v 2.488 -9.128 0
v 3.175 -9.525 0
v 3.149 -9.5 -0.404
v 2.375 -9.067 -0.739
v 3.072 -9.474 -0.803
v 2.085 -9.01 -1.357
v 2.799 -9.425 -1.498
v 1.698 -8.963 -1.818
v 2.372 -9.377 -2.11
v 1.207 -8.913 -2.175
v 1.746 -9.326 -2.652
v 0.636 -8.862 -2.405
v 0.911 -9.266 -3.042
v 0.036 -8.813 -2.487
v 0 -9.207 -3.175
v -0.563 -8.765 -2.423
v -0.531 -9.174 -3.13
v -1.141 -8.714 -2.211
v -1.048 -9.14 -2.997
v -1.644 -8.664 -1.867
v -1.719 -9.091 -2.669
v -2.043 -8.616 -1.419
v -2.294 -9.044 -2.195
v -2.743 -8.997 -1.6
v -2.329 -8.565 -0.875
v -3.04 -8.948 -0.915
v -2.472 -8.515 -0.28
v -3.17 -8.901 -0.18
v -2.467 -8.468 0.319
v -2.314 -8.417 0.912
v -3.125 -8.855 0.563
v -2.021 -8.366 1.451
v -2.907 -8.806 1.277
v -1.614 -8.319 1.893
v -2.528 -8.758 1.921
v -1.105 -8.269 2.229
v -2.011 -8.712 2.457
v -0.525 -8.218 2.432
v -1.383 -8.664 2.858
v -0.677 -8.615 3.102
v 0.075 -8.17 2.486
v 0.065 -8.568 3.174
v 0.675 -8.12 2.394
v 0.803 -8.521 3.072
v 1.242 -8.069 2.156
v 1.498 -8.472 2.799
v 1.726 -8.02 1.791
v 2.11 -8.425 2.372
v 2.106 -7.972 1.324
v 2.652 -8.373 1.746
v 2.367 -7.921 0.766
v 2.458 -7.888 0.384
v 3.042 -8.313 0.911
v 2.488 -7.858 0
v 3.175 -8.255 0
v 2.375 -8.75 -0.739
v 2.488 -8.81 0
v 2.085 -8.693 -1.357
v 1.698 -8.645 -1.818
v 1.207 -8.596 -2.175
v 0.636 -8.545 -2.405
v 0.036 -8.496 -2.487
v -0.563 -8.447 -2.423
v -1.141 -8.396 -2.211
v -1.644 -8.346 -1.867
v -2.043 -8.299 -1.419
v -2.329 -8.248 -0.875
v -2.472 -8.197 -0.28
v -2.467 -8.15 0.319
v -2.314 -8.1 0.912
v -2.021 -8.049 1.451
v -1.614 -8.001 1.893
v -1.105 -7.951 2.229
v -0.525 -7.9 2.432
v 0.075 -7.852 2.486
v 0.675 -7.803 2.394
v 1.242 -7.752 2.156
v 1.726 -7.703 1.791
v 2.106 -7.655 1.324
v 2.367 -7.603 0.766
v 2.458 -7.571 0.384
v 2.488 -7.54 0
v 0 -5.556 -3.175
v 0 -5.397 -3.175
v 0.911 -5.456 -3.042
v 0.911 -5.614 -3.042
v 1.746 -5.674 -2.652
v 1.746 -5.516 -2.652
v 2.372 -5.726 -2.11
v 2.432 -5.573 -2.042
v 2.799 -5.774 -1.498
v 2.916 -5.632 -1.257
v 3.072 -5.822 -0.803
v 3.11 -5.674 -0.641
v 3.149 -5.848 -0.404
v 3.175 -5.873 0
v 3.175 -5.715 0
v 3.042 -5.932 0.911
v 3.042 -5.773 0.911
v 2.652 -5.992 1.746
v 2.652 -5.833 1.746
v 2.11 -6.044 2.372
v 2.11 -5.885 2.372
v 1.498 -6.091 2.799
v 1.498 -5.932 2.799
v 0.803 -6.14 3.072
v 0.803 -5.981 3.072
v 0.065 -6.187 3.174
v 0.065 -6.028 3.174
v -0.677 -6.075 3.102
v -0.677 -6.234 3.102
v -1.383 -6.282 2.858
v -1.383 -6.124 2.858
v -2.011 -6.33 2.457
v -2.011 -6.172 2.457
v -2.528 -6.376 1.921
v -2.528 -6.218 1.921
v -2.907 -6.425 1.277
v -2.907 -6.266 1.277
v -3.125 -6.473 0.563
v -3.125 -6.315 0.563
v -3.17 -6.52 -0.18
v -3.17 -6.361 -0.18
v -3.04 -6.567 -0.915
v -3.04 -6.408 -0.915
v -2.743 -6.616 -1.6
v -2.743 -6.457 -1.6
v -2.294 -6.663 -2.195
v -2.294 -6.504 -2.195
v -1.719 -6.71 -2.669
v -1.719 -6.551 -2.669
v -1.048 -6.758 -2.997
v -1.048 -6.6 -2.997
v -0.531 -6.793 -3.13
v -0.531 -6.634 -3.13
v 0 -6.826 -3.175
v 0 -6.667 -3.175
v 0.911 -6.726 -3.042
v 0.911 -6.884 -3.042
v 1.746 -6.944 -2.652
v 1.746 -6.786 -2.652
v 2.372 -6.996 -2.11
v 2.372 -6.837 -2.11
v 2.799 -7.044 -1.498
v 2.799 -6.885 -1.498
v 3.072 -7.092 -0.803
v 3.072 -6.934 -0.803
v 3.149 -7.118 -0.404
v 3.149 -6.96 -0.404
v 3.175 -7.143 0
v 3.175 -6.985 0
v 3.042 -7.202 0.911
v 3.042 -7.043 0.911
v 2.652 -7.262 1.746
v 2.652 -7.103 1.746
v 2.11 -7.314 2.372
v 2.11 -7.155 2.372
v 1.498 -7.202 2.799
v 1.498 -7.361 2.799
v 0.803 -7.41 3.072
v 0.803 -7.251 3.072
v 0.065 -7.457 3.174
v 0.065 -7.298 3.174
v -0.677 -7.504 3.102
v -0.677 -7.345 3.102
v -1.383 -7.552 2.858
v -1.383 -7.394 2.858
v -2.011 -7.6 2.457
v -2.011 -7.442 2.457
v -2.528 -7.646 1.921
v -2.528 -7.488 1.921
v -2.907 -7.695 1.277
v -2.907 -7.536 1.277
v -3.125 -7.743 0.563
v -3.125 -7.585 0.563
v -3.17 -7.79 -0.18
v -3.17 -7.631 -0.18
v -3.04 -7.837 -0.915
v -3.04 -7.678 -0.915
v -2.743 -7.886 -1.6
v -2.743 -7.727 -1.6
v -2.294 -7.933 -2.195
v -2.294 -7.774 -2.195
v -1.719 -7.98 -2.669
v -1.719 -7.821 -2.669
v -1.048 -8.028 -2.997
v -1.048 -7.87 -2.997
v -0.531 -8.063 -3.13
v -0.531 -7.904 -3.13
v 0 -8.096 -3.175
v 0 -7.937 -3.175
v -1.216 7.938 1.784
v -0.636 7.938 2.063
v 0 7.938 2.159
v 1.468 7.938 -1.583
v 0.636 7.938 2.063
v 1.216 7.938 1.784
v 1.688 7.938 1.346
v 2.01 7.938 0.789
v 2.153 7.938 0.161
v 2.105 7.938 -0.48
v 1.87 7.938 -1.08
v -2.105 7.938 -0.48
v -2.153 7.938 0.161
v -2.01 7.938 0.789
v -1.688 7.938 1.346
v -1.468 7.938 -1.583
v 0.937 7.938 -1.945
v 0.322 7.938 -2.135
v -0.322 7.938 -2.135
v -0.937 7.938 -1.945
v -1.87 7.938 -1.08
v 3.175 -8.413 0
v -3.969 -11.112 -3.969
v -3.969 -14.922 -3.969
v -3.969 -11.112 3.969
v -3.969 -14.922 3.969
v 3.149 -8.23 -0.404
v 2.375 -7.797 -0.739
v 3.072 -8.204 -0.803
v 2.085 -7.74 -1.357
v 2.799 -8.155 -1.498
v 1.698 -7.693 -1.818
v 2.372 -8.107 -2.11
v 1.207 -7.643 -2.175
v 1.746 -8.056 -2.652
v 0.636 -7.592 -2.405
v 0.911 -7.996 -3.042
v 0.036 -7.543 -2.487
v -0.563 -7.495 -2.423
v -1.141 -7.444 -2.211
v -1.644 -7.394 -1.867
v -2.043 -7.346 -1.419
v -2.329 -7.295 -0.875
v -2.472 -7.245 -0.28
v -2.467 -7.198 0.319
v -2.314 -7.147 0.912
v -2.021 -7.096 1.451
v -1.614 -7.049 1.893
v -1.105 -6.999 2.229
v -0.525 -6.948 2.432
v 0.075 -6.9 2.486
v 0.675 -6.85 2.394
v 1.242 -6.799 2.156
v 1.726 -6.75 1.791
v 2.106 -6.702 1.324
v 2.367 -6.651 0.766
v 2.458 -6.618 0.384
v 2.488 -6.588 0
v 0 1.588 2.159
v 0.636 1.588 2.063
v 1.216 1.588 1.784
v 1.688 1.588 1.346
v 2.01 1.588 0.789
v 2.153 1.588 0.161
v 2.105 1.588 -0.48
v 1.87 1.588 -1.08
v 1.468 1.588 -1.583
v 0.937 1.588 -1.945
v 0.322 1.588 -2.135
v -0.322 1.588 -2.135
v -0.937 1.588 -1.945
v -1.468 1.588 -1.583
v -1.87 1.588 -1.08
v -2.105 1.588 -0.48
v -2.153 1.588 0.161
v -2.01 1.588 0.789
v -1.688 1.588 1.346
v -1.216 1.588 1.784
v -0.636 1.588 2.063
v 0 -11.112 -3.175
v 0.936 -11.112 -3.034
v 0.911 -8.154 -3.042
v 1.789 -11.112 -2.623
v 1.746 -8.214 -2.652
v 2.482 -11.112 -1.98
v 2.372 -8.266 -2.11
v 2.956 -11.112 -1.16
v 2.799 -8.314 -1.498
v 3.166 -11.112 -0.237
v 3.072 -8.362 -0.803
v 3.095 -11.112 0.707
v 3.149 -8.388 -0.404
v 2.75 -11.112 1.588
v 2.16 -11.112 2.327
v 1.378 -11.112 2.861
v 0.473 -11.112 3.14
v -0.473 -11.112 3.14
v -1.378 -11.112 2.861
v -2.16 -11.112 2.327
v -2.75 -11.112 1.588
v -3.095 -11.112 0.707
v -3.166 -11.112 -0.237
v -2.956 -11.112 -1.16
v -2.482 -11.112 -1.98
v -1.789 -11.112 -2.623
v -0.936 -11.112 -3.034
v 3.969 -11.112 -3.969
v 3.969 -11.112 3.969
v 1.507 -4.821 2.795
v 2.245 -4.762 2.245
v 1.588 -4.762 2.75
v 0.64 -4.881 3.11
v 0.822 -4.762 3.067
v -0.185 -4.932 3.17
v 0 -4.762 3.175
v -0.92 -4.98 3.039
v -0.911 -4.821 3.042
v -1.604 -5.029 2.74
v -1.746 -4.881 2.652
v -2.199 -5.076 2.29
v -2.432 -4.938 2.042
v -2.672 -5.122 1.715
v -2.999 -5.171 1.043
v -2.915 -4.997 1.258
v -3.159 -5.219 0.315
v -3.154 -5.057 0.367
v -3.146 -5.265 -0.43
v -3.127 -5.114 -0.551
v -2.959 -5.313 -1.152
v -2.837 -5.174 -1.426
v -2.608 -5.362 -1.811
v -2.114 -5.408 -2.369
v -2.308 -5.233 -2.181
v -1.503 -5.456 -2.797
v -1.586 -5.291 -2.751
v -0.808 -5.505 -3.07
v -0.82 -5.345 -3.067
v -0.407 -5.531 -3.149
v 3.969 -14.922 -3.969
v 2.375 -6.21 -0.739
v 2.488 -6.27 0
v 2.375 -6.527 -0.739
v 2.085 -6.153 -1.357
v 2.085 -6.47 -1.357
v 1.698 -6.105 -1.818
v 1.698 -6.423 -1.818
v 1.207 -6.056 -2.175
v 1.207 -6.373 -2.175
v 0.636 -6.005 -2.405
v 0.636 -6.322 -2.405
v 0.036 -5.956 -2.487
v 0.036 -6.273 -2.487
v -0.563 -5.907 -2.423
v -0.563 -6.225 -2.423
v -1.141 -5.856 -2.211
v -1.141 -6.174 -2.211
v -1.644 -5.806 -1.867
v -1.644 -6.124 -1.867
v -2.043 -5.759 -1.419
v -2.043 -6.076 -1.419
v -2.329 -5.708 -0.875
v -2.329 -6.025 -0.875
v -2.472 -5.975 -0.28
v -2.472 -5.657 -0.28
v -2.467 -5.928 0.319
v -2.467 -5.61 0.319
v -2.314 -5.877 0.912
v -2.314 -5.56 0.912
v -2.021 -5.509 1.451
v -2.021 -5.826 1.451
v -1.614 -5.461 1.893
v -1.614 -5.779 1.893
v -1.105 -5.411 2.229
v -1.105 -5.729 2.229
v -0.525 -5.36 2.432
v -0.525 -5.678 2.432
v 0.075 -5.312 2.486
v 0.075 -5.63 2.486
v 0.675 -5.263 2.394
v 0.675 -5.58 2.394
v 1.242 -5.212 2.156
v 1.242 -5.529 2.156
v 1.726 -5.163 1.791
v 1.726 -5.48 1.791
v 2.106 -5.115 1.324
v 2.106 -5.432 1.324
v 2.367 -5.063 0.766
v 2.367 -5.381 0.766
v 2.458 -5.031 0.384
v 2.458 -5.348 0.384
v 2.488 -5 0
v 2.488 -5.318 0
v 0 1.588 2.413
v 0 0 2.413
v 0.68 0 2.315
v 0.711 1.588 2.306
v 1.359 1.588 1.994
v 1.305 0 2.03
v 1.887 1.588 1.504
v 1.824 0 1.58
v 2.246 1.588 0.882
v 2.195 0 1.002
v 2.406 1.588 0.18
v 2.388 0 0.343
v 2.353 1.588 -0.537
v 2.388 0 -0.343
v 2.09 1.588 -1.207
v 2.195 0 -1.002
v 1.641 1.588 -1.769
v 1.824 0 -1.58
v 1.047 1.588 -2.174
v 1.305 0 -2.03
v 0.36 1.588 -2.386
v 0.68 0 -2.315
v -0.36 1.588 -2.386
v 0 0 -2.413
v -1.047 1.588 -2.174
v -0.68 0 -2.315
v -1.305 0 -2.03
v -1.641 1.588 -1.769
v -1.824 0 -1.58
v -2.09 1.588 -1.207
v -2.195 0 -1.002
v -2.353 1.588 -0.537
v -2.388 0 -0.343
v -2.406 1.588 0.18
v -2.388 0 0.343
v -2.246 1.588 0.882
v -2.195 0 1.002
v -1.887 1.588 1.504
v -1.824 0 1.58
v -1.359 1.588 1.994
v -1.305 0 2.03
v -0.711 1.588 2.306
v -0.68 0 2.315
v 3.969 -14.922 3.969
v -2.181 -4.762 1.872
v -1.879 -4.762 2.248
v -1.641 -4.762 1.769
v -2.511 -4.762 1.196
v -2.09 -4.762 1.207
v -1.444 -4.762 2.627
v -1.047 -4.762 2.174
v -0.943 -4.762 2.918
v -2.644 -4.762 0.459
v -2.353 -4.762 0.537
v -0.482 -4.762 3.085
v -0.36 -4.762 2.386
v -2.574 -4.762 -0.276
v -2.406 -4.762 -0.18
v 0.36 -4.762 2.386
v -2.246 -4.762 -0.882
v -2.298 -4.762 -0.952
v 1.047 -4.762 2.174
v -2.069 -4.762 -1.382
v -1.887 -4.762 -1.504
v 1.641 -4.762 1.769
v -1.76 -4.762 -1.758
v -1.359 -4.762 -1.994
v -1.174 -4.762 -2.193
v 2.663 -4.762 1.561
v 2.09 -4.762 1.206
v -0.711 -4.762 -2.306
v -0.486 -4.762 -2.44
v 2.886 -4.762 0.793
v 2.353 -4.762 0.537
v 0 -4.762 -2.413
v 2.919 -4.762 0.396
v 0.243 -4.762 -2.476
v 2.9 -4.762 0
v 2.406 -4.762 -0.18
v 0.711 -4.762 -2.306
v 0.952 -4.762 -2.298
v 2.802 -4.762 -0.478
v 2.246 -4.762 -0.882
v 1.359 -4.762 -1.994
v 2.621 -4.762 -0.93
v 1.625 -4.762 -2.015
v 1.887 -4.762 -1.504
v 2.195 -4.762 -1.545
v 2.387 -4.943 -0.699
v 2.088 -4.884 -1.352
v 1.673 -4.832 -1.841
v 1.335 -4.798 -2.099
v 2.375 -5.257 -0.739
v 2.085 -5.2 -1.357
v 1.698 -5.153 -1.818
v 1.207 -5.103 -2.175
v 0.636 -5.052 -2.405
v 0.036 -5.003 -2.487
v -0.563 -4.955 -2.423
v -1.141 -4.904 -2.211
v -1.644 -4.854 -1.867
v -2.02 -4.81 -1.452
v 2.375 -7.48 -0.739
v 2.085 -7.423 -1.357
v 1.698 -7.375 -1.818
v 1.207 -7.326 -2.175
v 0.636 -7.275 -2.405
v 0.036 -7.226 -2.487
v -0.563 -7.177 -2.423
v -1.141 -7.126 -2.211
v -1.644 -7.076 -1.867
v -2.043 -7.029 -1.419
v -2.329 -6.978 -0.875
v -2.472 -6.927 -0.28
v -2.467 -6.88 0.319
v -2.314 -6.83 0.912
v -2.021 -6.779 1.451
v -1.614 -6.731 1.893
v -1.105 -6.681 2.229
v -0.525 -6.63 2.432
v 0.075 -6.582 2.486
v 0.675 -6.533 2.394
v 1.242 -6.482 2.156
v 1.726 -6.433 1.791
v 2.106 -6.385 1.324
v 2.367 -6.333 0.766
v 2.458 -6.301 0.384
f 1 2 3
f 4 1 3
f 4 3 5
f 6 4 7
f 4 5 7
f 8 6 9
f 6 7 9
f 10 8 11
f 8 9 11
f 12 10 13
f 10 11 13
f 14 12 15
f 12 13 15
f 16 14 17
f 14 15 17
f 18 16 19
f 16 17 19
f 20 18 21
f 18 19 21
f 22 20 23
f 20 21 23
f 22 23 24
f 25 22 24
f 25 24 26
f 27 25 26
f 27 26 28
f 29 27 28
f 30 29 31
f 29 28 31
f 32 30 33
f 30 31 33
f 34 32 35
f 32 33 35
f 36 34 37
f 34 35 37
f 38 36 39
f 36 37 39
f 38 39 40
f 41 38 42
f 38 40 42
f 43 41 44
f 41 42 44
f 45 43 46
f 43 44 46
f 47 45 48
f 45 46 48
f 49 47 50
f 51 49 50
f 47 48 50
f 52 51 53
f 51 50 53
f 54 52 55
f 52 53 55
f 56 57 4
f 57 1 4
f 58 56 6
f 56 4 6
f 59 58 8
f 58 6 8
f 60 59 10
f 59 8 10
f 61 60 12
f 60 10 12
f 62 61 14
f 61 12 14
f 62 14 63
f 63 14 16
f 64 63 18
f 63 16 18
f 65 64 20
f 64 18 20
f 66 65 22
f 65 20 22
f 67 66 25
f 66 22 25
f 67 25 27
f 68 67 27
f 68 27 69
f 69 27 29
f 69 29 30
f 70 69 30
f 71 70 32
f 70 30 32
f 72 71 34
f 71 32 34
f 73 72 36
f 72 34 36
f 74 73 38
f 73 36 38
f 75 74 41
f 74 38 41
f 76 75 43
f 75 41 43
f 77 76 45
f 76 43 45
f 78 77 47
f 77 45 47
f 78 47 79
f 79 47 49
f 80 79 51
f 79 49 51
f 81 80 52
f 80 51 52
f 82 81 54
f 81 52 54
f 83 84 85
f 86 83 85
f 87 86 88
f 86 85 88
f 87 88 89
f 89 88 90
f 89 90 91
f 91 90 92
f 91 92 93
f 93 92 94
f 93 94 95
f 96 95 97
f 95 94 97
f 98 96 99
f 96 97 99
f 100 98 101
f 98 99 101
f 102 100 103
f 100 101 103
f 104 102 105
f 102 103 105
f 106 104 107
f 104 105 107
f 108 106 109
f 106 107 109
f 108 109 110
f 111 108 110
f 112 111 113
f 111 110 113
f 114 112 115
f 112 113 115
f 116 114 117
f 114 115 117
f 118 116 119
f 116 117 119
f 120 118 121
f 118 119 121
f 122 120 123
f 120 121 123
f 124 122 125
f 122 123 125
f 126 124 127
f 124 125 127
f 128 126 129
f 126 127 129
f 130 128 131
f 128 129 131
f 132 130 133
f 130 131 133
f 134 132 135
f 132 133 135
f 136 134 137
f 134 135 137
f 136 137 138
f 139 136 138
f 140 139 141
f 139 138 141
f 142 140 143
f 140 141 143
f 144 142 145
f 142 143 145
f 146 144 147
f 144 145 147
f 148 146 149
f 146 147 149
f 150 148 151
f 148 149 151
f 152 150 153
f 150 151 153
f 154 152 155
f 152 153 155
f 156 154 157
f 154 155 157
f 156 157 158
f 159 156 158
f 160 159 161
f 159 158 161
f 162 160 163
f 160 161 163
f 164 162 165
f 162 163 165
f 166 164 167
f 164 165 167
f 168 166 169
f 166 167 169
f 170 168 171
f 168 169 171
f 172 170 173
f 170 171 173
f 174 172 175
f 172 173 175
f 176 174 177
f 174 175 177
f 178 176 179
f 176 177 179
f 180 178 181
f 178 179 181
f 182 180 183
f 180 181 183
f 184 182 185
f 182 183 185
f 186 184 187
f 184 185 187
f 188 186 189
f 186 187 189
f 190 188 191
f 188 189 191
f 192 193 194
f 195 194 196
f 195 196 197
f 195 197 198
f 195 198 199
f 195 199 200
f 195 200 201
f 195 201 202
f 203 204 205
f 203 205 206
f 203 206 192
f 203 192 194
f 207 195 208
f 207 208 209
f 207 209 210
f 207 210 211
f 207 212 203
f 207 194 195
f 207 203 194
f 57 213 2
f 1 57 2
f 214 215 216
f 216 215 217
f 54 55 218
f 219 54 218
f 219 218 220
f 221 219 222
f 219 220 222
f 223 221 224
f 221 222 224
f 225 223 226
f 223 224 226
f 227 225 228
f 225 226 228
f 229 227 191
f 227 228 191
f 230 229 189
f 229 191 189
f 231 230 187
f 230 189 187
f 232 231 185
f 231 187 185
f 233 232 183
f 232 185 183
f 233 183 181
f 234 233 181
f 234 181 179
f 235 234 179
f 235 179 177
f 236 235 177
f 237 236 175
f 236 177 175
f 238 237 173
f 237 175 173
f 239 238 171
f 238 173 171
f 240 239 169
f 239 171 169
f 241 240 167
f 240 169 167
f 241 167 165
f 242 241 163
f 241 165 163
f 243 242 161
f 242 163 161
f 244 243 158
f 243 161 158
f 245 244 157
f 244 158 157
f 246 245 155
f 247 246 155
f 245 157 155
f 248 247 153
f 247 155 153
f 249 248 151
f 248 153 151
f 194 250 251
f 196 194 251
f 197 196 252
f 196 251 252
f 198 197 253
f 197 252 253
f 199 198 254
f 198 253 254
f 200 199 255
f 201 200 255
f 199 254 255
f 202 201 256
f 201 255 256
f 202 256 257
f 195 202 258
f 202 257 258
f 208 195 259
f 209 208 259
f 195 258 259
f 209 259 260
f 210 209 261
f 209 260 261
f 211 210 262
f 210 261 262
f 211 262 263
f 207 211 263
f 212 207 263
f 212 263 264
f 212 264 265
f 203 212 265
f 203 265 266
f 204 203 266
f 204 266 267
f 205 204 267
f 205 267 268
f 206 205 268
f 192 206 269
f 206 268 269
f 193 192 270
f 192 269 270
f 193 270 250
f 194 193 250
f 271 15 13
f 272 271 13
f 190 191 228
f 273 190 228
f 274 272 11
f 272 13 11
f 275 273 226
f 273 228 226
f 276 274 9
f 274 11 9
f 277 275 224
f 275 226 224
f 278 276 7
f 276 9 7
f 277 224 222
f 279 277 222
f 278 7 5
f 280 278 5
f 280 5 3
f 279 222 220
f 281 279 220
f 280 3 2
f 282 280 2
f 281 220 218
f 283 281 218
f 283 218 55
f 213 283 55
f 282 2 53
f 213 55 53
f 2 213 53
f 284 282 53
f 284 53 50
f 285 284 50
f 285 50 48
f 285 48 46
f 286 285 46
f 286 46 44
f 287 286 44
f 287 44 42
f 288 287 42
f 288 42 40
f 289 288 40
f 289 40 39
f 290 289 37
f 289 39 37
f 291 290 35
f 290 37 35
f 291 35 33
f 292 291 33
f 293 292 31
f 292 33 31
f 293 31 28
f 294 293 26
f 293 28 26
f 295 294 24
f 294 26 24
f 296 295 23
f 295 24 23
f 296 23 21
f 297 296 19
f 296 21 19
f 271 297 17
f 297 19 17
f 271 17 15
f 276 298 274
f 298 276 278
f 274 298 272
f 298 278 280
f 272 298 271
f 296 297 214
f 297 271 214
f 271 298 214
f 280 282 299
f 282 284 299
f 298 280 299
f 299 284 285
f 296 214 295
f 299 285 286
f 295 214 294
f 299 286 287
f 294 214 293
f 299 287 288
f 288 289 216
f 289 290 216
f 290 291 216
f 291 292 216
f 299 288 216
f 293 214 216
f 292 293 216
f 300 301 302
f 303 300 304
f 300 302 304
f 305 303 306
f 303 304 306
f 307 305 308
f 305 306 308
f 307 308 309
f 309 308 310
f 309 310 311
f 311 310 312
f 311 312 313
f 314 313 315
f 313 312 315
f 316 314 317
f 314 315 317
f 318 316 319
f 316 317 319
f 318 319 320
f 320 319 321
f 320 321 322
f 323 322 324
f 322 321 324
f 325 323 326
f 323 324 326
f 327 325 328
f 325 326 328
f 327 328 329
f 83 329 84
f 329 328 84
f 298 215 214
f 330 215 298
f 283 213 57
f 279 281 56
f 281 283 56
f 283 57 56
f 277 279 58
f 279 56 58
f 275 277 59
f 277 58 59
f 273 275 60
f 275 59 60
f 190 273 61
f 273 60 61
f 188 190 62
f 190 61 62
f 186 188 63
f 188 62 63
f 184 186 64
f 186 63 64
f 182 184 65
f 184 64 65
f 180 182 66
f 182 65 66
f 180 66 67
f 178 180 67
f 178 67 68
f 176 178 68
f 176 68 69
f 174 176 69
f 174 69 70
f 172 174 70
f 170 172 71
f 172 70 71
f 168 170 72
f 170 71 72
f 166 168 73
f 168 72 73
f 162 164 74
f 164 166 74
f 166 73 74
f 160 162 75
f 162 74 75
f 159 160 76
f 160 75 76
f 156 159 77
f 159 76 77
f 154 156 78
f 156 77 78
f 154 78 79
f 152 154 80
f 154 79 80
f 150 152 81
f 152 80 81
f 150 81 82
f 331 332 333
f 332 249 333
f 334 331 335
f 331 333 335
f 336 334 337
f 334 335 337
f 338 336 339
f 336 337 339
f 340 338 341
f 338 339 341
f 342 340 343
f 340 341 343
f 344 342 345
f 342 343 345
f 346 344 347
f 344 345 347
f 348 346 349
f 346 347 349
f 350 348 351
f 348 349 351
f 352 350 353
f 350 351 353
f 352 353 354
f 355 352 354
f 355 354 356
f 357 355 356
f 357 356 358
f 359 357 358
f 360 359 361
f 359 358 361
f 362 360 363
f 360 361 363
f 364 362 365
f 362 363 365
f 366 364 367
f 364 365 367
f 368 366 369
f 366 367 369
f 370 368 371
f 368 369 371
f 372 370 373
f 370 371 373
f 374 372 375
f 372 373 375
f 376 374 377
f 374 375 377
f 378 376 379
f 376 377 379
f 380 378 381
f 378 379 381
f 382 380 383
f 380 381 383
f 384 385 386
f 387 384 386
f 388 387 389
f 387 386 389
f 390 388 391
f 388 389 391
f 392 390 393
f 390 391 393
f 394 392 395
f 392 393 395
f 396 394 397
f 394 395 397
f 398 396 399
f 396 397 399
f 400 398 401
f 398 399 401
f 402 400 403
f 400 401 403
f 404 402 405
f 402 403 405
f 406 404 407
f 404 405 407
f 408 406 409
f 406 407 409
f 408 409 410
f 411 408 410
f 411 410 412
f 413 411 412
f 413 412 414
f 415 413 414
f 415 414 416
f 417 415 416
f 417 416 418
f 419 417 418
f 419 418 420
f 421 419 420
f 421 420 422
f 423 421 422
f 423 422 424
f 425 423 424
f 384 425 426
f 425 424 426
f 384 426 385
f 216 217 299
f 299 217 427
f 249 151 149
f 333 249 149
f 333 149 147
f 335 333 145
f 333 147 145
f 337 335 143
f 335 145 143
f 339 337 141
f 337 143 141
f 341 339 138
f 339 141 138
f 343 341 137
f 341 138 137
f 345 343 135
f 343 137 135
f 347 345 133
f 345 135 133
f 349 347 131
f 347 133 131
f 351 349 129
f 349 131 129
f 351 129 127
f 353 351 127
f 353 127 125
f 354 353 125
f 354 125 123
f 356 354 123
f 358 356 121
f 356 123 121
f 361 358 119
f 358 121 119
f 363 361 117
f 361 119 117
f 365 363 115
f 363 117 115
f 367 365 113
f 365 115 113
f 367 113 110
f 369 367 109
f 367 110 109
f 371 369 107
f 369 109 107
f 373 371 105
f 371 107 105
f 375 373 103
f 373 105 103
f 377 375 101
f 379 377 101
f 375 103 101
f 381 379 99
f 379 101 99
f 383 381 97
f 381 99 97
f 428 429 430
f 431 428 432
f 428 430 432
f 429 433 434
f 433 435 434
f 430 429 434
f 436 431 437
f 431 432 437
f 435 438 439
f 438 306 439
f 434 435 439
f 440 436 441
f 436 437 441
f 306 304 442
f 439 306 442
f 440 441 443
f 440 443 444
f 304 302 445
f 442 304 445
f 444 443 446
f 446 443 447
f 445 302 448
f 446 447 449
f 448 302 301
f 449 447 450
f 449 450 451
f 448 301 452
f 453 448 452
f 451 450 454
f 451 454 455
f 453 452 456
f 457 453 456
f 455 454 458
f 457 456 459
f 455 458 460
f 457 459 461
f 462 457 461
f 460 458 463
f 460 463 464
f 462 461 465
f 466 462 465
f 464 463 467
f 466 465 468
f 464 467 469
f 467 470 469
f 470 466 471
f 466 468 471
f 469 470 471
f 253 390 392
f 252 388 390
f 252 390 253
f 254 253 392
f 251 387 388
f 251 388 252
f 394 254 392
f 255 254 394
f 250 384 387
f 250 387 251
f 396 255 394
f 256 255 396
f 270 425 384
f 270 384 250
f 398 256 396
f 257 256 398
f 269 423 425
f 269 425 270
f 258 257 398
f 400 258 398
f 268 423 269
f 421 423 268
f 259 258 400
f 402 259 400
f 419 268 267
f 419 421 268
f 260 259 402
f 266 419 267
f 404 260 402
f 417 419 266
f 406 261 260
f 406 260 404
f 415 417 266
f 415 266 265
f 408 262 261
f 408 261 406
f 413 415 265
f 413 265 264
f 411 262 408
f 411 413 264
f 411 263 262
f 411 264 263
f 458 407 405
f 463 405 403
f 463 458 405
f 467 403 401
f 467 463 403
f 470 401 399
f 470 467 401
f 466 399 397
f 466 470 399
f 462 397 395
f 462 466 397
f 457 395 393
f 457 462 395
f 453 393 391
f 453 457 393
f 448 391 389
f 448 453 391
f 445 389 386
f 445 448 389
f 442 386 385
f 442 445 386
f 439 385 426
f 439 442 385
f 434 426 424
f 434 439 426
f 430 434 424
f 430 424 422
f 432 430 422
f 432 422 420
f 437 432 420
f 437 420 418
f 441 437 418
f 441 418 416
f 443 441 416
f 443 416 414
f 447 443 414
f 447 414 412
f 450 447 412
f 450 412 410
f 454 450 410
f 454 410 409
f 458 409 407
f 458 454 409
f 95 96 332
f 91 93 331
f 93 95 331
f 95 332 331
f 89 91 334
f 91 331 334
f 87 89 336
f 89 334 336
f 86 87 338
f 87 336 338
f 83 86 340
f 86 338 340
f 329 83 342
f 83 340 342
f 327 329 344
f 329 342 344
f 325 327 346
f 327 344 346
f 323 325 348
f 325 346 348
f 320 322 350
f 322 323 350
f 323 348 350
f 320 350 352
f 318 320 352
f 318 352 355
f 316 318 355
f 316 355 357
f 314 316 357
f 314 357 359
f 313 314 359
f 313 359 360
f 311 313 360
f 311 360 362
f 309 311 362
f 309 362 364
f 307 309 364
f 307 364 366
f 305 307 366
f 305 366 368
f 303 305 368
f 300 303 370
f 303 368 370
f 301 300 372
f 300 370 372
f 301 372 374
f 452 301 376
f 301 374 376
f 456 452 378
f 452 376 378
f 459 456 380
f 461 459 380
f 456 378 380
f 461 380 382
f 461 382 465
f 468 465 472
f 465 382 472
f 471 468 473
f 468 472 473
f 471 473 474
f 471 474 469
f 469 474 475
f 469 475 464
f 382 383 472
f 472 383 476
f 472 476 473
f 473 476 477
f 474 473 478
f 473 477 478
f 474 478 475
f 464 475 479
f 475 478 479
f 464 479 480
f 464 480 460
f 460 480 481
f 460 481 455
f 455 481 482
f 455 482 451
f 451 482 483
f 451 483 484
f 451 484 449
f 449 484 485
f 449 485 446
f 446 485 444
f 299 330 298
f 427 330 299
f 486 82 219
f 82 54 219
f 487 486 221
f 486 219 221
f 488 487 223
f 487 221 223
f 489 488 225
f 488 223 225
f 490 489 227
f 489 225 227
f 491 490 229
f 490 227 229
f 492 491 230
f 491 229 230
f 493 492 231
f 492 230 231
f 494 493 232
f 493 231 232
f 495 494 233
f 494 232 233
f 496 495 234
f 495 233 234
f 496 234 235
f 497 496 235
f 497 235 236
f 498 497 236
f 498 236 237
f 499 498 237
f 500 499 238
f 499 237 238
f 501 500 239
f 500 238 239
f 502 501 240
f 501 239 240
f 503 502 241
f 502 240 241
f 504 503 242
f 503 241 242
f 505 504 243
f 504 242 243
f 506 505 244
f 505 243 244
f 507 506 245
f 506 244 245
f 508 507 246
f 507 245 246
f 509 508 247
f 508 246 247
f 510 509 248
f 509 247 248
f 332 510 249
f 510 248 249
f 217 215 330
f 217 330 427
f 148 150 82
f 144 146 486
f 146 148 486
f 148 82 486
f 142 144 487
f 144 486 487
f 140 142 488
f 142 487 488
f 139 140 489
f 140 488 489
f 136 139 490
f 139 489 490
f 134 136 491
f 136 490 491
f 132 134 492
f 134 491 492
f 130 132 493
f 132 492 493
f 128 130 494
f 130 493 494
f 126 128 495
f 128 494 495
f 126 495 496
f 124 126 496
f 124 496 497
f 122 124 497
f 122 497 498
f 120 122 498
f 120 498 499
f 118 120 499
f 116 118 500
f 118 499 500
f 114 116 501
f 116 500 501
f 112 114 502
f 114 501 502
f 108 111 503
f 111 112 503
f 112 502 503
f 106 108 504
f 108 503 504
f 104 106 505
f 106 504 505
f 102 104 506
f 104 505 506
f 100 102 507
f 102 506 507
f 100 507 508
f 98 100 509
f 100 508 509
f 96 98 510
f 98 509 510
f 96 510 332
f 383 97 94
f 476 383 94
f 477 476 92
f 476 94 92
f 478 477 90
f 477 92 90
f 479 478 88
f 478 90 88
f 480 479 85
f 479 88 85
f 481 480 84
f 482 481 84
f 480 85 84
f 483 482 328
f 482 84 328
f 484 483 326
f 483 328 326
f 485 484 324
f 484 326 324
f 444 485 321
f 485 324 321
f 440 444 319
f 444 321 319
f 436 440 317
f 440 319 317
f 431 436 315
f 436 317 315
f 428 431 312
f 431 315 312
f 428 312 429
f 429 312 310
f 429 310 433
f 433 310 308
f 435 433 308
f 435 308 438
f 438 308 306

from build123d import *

# Parameters (mm, degrees)
SKETCH1_R           = 2.413
BOSS_EXTRUDE1_DEPTH = 6.35
BOSS_EXTRUDE2_START = 4.762246
SKETCH2_R           = 2.413
BOSS_EXTRUDE2_DEPTH = 4.762246
SKETCH3_R           = 3.175
BOSS_EXTRUDE3_DEPTH = 3.175
SKETCH4_R           = 3.175
BOSS_EXTRUDE4_DEPTH = 3.175
THREAD2_PITCH       = 1.27
SKETCH11_R          = 6.35
BOSS_EXTRUDE5_DEPTH = 3.81
CUT_EXTRUDE1_START  = -0.952246
SKETCH13_R          = 2.413
CUT_EXTRUDE1_DEPTH  = 0.952246
SKETCH14_R          = 2.413
BOSS_EXTRUDE6_DEPTH = 2.54
SKETCH16_W          = 13.786641265
SKETCH16_H          = 13.864798174
SKETCH16_W_2        = 7.9375
SKETCH16_H_2        = 7.9375
CUT_EXTRUDE3_DEPTH  = 3.81
CUT_EXTRUDE4_START  = -6.35
SKETCH17_R          = 2.413
SKETCH17_R_2        = 2.159
CUT_EXTRUDE4_DEPTH  = 6.35


with BuildPart() as part:
    # Sketch1 → Boss-Extrude1 (new body)
    with BuildSketch(Plane(origin=(0, 0, 0), x_dir=(1, 0, 0), z_dir=(0, 1, 0))):
        with Locations(Location((0, 0, 0), (0, 0, 270))):
            Circle(SKETCH1_R)
    extrude(amount=BOSS_EXTRUDE1_DEPTH)

    # Sketch2 → Boss-Extrude2 (add)
    with BuildSketch(Plane(origin=(0, 0, 0), x_dir=(-1, 0, 0), z_dir=(0, -1, 0)).offset(BOSS_EXTRUDE2_START)):
        with Locations(Location((0, 0, 0), (0, 0, 90))):
            Circle(SKETCH2_R)
    extrude(amount=-BOSS_EXTRUDE2_DEPTH)

    # Sketch3 → Boss-Extrude3 (add)
    with BuildSketch(Plane(origin=(0, -4.762246, 0), x_dir=(-1, 0, 0), z_dir=(0, -1, 0))):
        with Locations(Location((0, 0, 0), (0, 0, 90))):
            Circle(SKETCH3_R)
    extrude(amount=BOSS_EXTRUDE3_DEPTH)

    # Sketch4 → Boss-Extrude4 (add)
    with BuildSketch(Plane(origin=(0, -7.937246, 0), x_dir=(-1, 0, 0), z_dir=(0, -1, 0))):
        with Locations(Location((0, 0, 0), (0, 0, 90))):
            Circle(SKETCH4_R)
    extrude(amount=BOSS_EXTRUDE4_DEPTH)

    # Thread2: the profile of Thread Profile3 profile screwed along a right-hand helix of 3.75 turns, 8 arcs to a turn; built about Z, then put on its axis
    thread2_z = Axis((0, 0, 0), (0, 0, 1))
    thread2_corners = [(3.1753, 0, -0.000173205), (3.1753, 0, 1.111423202), (2.487592339, 0, 0.714374998), (2.487592339, 0, 0.396874998)]
    with BuildLine(mode=Mode.PRIVATE) as thread2_profile:
        Line(thread2_corners[0], thread2_corners[1])
        Line(thread2_corners[1], thread2_corners[2])
        Line(thread2_corners[2], thread2_corners[3])
        Line(thread2_corners[3], thread2_corners[0])
    thread2_cap = Face(thread2_profile.wire())
    thread2_turn_angles = [0, 22.5, 45, 67.5, 90, 112.5, 135, 157.5, 180, 202.5, 225, 247.5, 270, 292.5, 315, 337.5, 360]
    thread2_turn_weights = [1, 0.9238795325112867, 1, 0.9238795325112867, 1, 0.9238795325112867, 1, 0.9238795325112867, 1, 0.9238795325112867, 1, 0.9238795325112867, 1, 0.9238795325112867, 1, 0.9238795325112867, 1]
    thread2_turn_rails = [Edge.make_bspline([Vector(p[0], p[1], 0).rotate(thread2_z, thread2_turn_angles[k]) / thread2_turn_weights[k] + Vector(0, 0, p[2] + THREAD2_PITCH * thread2_turn_angles[k] / 360) for k in range(17)], [0, 0, 0, 1, 1, 2, 2, 3, 3, 4, 4, 5, 5, 6, 6, 7, 7, 8, 8, 8], 2, thread2_turn_weights) for p in thread2_corners]
    thread2_turn_sides = [Face.make_surface_from_curves(thread2_turn_rails[p[0]], thread2_turn_rails[p[1]]) for p in [(0, 1), (1, 2), (2, 3), (3, 0)]]
    thread2_last_angles = [1080, 1102.5, 1125, 1147.5, 1170, 1192.5, 1215, 1237.5, 1260, 1282.5, 1305, 1327.5, 1350]
    thread2_last_weights = [1, 0.9238795325112867, 1, 0.9238795325112867, 1, 0.9238795325112867, 1, 0.9238795325112867, 1, 0.9238795325112867, 1, 0.9238795325112883, 1]
    thread2_last_rails = [Edge.make_bspline([Vector(p[0], p[1], 0).rotate(thread2_z, thread2_last_angles[k]) / thread2_last_weights[k] + Vector(0, 0, p[2] + THREAD2_PITCH * thread2_last_angles[k] / 360) for k in range(13)], [0, 0, 0, 1, 1, 2, 2, 3, 3, 4, 4, 5, 5, 6, 6, 6], 2, thread2_last_weights) for p in thread2_corners]
    thread2_last_sides = [Face.make_surface_from_curves(thread2_last_rails[p[0]], thread2_last_rails[p[1]]) for p in [(0, 1), (1, 2), (2, 3), (3, 0)]]
    thread2 = Plane(origin=(0, -9.524746, 0), x_dir=(1, 0, 0), z_dir=(0, 1, 0)) * Solid(Shell([*[p.moved(Location((0, 0, THREAD2_PITCH * i))) for i in range(3) for p in thread2_turn_sides], *thread2_last_sides, thread2_cap, thread2_cap.rotate(thread2_z, 1350).moved(Location((0, 0, THREAD2_PITCH * 1350 / 360)))]))
    add(thread2, mode=Mode.SUBTRACT)

    # Sketch11 → Boss-Extrude5 (add)
    with BuildSketch(Plane(origin=(0, -11.112246, 0), x_dir=(-1, 0, 0), z_dir=(0, -1, 0))):
        with Locations(Location((0, 0, 0), (0, 0, 270))):
            Circle(SKETCH11_R)
    extrude(amount=BOSS_EXTRUDE5_DEPTH)

    # Sketch13 → Cut-Extrude1 (cut)
    with BuildSketch(Plane(origin=(0, 6.35, 0), x_dir=(1, 0, 0), z_dir=(0, 1, 0)).offset(CUT_EXTRUDE1_START)):
        with Locations(Location((0, 0, 0), (0, 0, 90))):
            Circle(SKETCH13_R)
    extrude(amount=CUT_EXTRUDE1_DEPTH, mode=Mode.SUBTRACT)

    # Sketch14 → Boss-Extrude6 (add)
    with BuildSketch(Plane(origin=(0, 5.397754, 0), x_dir=(1, 0, 0), z_dir=(0, 1, 0))):
        with Locations(Location((0, 0, 0), (0, 0, 90))):
            Circle(SKETCH14_R)
    extrude(amount=BOSS_EXTRUDE6_DEPTH)

    # Sketch16 → Cut-Extrude3 (cut)
    with BuildSketch(Plane.XZ.offset(14.922246)):
        with Locations((-0.248819293, 0.124312734)):
            Rectangle(SKETCH16_W, SKETCH16_H)
        Rectangle(SKETCH16_W_2, SKETCH16_H_2, mode=Mode.SUBTRACT)
    extrude(amount=-CUT_EXTRUDE3_DEPTH, mode=Mode.SUBTRACT)

    # Sketch17 → Cut-Extrude4 (cut)
    with BuildSketch(Plane(origin=(0, 7.937754, 0), x_dir=(1, 0, 0), z_dir=(0, 1, 0)).offset(CUT_EXTRUDE4_START)):
        with Locations(Location((0, 0, 0), (0, 0, 90))):
            Circle(SKETCH17_R)
        with Locations(Location((0, 0, 0), (0, 0, 270))):
            Circle(SKETCH17_R_2, mode=Mode.SUBTRACT)
    extrude(amount=CUT_EXTRUDE4_DEPTH, mode=Mode.SUBTRACT)


solid = part.part
